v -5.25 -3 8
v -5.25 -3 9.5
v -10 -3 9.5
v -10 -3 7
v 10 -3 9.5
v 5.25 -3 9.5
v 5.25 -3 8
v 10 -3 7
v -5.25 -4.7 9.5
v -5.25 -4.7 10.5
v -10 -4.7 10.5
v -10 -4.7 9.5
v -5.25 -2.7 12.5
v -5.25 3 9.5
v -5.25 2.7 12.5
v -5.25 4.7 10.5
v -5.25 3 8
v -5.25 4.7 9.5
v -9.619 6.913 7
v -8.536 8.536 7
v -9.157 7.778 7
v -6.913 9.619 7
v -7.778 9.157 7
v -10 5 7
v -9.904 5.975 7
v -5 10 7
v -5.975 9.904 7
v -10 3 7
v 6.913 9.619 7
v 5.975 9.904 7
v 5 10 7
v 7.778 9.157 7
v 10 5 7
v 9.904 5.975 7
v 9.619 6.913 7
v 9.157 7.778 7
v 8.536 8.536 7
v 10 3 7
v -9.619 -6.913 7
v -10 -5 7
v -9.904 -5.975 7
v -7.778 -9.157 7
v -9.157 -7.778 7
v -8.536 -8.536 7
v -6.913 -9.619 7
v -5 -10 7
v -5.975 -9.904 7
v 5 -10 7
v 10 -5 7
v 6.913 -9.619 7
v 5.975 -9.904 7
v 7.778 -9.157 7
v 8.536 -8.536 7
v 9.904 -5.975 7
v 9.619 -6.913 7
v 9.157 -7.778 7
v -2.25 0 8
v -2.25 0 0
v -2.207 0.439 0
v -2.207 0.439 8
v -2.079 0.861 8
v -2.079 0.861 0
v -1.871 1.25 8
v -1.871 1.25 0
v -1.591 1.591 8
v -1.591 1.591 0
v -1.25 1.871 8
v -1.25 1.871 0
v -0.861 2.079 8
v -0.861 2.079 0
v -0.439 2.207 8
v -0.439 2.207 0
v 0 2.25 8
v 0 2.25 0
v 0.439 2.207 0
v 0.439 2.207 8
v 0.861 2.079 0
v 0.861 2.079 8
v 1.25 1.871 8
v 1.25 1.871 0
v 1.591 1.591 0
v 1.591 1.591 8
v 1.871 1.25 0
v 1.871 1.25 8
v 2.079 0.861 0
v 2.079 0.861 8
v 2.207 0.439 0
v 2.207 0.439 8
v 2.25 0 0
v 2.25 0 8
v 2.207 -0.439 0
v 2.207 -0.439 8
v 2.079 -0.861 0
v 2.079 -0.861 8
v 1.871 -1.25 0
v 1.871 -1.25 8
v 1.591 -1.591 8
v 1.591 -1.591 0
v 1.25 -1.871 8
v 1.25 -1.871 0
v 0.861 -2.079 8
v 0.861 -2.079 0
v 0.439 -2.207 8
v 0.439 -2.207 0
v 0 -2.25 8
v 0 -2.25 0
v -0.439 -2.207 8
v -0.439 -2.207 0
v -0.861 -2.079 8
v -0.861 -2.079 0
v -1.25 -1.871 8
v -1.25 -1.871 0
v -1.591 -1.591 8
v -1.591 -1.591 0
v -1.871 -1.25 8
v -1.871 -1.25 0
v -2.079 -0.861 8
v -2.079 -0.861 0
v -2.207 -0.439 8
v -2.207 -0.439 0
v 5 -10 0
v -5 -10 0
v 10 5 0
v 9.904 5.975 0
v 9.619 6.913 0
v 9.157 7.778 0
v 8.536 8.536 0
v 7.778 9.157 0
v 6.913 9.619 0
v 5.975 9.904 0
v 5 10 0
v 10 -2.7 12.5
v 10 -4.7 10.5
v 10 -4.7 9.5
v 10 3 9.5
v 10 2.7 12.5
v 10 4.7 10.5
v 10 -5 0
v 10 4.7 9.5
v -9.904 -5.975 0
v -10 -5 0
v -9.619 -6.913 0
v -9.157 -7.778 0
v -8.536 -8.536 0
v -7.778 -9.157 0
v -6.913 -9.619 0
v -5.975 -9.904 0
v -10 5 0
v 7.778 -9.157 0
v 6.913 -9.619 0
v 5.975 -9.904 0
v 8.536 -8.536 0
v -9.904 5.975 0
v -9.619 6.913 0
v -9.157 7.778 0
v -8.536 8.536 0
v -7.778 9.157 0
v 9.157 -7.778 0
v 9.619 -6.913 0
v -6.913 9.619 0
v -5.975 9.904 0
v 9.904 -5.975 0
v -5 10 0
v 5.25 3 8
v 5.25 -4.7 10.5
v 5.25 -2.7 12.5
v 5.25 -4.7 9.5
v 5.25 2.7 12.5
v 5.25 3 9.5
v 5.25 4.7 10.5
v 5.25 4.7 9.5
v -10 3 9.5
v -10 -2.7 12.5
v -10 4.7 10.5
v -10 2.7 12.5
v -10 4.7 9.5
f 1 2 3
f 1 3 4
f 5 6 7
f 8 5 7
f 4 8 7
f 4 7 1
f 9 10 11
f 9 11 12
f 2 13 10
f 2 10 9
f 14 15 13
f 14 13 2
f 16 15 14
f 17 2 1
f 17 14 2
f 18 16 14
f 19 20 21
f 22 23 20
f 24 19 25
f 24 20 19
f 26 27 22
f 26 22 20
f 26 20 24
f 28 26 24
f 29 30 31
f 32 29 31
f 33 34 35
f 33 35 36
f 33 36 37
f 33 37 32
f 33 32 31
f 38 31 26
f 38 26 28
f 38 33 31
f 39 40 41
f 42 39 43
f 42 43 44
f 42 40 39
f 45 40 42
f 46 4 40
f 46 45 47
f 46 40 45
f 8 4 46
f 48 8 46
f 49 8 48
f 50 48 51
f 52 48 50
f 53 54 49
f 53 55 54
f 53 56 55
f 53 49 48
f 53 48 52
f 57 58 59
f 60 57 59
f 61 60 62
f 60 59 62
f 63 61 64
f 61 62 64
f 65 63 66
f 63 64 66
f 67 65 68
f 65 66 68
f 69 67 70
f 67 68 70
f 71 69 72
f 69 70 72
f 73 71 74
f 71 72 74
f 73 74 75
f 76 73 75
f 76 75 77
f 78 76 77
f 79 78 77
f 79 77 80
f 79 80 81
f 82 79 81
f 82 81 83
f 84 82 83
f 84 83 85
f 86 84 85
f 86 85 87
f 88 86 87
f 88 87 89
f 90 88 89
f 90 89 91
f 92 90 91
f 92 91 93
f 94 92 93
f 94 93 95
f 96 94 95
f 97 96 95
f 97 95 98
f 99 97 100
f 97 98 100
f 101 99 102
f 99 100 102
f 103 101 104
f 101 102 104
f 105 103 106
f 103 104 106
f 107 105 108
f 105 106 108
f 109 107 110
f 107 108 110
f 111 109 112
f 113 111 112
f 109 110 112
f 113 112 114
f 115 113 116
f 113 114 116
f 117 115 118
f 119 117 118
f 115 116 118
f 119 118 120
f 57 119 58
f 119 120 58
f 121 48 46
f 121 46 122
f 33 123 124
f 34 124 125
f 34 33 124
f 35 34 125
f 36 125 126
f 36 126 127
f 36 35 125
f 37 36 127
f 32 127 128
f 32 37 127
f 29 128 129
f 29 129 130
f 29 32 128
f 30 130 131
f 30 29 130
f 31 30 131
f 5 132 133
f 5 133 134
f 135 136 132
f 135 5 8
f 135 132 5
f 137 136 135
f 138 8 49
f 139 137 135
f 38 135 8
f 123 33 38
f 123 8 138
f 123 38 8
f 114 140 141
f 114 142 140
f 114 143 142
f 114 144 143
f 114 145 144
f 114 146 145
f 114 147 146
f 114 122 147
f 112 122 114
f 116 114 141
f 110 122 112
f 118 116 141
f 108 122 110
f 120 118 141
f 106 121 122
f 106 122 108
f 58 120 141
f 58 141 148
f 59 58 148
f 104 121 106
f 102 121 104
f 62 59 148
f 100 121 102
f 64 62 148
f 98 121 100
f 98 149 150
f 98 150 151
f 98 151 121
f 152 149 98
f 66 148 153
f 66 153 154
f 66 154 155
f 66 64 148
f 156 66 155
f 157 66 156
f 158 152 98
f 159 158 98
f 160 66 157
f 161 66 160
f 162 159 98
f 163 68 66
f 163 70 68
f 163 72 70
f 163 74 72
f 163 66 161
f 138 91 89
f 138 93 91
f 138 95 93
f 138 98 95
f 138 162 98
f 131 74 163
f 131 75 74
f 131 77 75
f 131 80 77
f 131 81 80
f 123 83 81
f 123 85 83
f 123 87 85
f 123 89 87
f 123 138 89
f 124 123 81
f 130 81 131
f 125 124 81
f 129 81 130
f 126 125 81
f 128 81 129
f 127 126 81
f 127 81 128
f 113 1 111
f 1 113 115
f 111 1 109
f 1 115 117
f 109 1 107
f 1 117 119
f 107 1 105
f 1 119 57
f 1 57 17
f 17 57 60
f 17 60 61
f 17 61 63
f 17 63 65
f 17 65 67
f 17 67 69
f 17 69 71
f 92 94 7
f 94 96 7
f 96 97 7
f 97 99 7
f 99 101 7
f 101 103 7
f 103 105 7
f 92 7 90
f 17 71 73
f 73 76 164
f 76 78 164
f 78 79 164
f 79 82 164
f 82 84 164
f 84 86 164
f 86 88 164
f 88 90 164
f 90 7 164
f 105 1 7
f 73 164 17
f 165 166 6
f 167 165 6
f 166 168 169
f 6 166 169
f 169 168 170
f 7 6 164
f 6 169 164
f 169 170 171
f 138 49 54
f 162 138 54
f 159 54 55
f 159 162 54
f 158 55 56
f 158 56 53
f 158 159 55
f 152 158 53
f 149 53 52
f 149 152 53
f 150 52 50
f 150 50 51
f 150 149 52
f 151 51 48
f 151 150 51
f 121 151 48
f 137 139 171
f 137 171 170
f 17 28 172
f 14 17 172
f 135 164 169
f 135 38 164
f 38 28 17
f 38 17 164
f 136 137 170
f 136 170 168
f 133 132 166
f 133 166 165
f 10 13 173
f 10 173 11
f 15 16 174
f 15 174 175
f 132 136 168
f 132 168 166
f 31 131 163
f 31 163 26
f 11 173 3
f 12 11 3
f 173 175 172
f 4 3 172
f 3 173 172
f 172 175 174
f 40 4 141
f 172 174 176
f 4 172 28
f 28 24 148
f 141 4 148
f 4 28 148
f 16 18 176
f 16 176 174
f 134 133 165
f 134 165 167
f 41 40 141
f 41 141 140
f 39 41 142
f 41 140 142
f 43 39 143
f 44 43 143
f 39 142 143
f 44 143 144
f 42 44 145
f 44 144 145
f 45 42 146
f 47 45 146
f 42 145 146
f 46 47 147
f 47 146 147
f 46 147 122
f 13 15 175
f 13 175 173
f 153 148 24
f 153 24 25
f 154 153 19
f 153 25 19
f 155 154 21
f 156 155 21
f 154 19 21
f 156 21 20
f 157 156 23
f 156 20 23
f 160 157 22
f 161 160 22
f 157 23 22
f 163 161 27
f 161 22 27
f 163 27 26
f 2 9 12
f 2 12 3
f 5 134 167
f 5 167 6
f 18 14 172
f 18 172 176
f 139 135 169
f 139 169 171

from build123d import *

# Parameters (mm, degrees)
BOSS_EXTRUDE1_DEPTH = 10
SKETCH3_R           = 2.25
CUT_EXTRUDE1_DEPTH  = 19.874586088
SKETCH4_W           = 9
SKETCH4_H           = 17.100076188
CUT_EXTRUDE2_DEPTH  = 5.25
FILLET1_R           = 5


with BuildPart() as part:
    # Sketch1 → Boss-Extrude1 (new, symmetric)
    with BuildSketch(Plane(origin=(0, 0, 0), x_dir=(0, 0, -1), z_dir=(1, 0, 0))):
        Polygon((-9.5, 3), (-9.5, 4.7), (-10.5, 4.7), (-12.5, 2.7), (-12.5, -2.7), (-10.5, -4.7), (-9.5, -4.7), (-9.5, -3), (-7, -3), (-7, -10), (0, -10), (0, 10), (-7, 10), (-7, 3), align=None)
    extrude(amount=BOSS_EXTRUDE1_DEPTH, both=True)

    # Sketch3 → Cut-Extrude1 (cut, through all)
    with BuildSketch(Plane(origin=(0, 0, 0), x_dir=(-1, 0, 0), z_dir=(0, 0, -1))):
        Circle(SKETCH3_R)
    extrude(amount=-CUT_EXTRUDE1_DEPTH, mode=Mode.SUBTRACT)

    # Sketch4 → Cut-Extrude2 (cut, symmetric)
    with BuildSketch(Plane(origin=(0, 0, 0), x_dir=(0, 0, -1), z_dir=(1, 0, 0))):
        with Locations((-12.5, 0)):
            Rectangle(SKETCH4_W, SKETCH4_H)
    extrude(amount=CUT_EXTRUDE2_DEPTH, both=True, mode=Mode.SUBTRACT)

    # Fillet1
    fillet1_edges = [part.edges().sort_by_distance(p)[0] for p in [
        (10, -10, 3.5),
        (-10, 10, 3.5),
        (-10, -10, 3.5),
        (10, 10, 3.5),
    ]]
    fillet(fillet1_edges, radius=FILLET1_R)


solid = part.part
